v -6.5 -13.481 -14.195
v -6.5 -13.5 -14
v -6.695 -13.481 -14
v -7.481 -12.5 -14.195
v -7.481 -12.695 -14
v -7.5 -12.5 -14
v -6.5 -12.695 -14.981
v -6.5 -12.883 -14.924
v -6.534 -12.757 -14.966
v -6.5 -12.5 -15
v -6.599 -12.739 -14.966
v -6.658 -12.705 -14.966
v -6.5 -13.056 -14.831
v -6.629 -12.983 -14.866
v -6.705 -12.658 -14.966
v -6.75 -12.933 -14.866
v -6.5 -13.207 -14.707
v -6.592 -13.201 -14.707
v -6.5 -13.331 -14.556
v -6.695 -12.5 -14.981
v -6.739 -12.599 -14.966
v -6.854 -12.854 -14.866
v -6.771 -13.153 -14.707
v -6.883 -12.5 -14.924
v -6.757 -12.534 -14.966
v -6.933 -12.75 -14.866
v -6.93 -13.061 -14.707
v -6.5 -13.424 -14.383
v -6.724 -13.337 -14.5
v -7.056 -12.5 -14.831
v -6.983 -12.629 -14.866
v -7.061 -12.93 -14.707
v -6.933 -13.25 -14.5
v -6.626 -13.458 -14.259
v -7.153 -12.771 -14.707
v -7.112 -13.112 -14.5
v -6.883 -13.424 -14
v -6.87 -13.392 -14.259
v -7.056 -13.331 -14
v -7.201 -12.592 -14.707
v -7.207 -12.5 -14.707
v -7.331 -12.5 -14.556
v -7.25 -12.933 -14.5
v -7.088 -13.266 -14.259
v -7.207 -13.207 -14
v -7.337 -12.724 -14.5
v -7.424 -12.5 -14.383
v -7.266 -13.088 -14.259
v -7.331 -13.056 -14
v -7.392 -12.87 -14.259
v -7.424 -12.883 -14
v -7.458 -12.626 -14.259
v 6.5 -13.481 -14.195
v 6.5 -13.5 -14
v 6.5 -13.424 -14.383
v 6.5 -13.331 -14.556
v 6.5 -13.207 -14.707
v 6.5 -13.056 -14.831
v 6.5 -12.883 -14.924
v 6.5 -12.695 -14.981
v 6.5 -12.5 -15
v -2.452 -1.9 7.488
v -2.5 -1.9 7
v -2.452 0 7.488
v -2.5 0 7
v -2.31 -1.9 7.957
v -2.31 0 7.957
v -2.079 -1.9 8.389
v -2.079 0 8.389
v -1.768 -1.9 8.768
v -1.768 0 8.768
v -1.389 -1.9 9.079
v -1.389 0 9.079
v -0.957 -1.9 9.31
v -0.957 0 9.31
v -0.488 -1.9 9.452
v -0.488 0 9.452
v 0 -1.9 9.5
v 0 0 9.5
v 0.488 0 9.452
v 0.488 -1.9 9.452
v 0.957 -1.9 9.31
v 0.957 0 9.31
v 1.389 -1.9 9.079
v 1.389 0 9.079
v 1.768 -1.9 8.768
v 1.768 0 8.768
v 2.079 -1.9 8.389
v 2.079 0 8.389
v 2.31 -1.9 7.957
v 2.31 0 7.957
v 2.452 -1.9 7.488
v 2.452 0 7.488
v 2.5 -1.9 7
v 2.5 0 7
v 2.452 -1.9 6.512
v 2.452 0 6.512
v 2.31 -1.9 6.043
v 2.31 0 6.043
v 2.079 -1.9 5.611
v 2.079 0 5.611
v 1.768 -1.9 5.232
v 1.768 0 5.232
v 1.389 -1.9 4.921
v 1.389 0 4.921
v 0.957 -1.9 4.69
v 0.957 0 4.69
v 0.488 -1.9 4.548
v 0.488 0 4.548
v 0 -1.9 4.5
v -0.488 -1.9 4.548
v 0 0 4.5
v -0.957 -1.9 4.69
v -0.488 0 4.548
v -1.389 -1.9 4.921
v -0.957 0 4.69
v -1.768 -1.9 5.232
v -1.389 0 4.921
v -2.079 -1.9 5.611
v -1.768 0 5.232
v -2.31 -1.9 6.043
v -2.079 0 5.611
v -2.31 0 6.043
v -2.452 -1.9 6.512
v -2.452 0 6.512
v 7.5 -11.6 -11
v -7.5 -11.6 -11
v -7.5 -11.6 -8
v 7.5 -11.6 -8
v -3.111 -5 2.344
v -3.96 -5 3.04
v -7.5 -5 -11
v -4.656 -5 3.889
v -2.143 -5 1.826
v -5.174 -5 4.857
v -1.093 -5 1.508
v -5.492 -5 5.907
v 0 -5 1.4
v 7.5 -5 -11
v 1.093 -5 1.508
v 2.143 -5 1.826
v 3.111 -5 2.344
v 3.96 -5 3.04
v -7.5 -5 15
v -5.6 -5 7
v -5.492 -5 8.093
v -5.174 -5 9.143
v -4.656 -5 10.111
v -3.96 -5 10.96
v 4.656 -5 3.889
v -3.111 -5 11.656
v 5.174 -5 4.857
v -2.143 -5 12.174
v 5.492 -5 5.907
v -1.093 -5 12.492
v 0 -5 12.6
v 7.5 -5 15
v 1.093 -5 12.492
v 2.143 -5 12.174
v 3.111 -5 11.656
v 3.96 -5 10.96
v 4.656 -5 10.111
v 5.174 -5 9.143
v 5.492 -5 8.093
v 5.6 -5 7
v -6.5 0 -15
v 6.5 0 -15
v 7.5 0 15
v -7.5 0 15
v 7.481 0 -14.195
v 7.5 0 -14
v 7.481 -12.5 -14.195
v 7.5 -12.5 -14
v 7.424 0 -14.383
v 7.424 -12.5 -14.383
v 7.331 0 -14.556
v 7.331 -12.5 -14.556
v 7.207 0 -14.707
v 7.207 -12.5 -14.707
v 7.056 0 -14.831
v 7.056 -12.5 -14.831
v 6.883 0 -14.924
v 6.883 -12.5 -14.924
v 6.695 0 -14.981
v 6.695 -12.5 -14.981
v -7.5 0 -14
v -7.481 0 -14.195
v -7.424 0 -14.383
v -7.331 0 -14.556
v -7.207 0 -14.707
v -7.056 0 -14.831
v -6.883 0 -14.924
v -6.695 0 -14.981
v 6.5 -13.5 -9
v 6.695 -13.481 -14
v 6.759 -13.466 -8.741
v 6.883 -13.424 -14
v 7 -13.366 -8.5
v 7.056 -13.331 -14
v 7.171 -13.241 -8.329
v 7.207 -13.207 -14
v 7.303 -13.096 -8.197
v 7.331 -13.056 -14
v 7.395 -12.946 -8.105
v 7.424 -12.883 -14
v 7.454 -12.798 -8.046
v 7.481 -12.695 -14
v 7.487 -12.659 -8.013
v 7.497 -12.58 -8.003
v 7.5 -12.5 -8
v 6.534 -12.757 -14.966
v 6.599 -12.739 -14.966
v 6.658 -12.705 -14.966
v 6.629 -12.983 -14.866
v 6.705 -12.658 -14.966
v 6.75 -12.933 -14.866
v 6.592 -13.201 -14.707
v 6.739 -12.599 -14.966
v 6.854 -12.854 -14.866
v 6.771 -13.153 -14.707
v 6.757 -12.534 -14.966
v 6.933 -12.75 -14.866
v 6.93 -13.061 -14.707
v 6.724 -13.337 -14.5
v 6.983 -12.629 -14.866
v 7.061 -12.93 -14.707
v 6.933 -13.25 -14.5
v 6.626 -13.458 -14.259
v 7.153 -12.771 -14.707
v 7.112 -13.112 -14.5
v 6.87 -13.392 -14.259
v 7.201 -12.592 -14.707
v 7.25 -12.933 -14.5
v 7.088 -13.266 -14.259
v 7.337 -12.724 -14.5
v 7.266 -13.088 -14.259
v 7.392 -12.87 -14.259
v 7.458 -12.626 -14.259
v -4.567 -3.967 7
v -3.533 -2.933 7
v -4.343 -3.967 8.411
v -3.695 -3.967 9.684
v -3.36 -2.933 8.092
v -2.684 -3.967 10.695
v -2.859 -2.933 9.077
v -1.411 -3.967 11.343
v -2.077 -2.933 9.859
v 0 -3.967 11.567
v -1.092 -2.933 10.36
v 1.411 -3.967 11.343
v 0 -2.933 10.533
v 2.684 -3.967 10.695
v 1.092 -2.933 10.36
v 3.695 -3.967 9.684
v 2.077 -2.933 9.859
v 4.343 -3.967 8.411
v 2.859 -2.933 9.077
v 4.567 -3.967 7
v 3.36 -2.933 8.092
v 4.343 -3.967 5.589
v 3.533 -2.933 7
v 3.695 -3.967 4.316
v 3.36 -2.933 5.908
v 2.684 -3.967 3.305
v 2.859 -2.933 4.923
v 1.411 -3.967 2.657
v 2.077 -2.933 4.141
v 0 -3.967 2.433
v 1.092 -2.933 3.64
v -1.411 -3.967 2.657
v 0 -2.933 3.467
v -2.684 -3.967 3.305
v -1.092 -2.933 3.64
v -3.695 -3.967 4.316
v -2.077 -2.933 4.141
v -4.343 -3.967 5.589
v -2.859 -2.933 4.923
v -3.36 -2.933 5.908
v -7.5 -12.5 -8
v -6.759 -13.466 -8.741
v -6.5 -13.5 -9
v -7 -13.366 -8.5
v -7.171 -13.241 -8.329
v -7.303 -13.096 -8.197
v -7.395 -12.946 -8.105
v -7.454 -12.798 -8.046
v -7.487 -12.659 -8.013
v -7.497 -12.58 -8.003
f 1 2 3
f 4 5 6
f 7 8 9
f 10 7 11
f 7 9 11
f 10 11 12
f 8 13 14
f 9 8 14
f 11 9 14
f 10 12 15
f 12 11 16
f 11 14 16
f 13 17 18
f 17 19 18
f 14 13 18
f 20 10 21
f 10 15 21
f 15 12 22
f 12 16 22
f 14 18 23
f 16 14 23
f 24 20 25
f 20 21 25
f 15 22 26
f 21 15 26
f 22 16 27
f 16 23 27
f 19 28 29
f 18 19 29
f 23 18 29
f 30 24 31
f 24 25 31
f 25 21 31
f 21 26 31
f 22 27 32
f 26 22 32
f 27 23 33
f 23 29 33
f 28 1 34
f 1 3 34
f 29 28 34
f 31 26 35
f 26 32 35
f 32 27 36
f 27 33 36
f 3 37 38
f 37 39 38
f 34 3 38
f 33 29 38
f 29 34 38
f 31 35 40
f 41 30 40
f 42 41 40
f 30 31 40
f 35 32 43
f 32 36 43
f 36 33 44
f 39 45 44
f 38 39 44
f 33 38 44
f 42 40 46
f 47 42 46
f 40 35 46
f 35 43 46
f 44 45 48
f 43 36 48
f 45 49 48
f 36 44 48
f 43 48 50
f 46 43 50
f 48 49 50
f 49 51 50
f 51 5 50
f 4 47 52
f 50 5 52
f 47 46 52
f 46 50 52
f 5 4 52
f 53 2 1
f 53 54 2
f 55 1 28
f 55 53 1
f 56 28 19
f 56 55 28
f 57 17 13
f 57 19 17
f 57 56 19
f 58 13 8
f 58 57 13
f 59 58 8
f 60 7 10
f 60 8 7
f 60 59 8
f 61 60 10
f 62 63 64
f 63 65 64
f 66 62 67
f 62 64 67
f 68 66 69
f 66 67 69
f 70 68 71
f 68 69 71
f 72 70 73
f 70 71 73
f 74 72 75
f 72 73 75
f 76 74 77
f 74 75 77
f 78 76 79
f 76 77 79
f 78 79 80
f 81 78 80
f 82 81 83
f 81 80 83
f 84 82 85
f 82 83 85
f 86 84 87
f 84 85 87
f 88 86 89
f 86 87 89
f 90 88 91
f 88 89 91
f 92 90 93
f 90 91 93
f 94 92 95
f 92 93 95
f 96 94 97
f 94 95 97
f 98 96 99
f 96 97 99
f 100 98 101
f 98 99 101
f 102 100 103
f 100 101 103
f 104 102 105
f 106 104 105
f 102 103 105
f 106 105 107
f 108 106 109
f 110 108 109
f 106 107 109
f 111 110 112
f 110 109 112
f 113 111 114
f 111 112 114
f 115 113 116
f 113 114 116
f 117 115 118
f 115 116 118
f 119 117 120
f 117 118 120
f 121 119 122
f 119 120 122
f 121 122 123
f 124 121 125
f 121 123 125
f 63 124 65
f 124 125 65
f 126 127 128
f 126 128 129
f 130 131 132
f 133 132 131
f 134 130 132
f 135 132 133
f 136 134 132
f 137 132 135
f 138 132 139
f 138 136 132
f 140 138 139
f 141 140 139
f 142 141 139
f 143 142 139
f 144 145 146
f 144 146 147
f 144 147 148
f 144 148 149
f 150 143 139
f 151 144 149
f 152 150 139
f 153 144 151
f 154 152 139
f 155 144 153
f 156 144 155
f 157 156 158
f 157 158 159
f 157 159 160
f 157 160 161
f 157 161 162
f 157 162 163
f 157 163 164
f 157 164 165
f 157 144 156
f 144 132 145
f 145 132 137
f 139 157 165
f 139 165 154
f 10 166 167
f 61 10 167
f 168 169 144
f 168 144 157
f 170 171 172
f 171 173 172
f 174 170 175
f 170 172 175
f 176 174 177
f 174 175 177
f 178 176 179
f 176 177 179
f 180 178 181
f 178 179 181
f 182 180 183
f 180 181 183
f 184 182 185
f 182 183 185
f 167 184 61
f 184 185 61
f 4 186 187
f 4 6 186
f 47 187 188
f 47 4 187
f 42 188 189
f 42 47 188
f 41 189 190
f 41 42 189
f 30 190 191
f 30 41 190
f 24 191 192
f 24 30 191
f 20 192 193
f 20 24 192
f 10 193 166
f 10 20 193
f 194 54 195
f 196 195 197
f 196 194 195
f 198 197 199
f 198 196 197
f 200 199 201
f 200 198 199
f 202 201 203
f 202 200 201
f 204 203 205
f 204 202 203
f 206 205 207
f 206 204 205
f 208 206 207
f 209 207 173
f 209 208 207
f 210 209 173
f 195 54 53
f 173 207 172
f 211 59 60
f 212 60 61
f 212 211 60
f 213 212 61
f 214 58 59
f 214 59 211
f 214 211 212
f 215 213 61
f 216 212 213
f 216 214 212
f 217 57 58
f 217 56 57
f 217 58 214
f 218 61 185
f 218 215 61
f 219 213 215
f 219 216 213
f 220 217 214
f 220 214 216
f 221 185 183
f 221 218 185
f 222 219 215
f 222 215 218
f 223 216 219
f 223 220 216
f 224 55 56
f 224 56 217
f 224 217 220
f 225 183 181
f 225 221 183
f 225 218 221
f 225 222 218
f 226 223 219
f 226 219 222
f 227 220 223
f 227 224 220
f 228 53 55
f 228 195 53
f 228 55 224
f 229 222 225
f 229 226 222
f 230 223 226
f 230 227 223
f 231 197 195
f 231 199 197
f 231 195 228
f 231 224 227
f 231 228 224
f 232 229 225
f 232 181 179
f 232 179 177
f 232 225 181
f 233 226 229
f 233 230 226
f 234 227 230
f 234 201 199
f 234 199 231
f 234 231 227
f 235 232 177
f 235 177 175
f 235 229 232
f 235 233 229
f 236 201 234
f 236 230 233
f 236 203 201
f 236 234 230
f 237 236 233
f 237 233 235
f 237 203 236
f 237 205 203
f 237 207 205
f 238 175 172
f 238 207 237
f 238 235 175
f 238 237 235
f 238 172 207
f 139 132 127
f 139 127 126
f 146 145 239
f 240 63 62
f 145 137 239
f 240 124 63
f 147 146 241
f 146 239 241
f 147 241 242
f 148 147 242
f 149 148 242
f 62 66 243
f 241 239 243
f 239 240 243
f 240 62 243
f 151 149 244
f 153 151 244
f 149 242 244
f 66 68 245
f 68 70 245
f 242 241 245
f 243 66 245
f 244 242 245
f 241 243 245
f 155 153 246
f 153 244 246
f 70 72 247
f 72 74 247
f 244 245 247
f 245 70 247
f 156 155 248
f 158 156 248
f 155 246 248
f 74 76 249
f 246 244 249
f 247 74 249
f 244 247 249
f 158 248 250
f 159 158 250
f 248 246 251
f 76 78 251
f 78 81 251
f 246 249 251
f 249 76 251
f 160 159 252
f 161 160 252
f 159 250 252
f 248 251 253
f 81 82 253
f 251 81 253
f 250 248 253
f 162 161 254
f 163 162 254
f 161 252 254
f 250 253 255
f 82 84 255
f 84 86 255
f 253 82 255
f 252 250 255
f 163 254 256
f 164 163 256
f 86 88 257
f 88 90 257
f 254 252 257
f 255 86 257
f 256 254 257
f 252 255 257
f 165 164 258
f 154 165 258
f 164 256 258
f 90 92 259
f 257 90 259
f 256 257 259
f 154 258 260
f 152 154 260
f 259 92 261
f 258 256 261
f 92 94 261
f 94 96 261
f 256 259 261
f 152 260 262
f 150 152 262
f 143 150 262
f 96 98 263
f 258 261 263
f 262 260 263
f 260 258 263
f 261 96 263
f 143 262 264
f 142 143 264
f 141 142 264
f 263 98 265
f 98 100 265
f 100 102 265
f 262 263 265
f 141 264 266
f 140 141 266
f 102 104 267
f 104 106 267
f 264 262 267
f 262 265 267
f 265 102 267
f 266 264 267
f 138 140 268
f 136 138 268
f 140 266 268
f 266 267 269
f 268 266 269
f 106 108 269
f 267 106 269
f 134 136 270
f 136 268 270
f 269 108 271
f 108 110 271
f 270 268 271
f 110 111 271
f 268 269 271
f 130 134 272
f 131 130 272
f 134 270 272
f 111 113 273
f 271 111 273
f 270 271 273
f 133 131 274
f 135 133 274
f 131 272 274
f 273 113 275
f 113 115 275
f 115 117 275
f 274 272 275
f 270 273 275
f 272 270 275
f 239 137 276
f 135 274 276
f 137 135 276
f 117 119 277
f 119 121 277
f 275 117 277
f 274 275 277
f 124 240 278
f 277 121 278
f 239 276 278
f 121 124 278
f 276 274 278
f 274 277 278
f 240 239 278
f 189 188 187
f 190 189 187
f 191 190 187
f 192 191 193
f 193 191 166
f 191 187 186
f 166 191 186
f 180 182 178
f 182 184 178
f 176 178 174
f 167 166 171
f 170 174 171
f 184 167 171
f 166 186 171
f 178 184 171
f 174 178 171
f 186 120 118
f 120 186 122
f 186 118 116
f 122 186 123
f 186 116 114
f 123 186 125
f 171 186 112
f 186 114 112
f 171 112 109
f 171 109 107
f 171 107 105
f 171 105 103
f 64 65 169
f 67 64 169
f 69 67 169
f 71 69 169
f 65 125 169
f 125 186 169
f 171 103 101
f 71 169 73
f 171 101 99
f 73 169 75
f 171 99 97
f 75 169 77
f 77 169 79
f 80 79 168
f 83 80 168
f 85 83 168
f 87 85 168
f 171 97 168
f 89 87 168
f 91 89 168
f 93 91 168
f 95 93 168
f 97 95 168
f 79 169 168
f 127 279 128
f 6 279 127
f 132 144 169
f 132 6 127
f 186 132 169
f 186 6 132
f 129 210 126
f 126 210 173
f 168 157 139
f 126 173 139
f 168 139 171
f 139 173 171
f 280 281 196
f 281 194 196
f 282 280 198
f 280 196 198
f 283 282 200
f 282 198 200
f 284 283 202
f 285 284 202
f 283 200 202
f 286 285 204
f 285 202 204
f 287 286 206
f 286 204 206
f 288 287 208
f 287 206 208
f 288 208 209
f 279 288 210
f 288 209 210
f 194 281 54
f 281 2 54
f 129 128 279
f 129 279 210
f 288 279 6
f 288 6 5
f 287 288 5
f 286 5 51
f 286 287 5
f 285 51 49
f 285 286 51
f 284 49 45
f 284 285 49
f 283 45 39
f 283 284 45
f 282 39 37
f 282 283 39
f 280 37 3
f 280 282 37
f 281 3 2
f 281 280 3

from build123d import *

# Parameters (mm, degrees)
F0_W           = 15
F0_H           = 30
F1_DEPTH       = 5
F3_D           = 5
F3_CSINK_D     = 11.2
F3_CSINK_ANGLE = 90
F4_W           = 15
F4_H           = 4
F5_DEPTH       = 8.5
F6_W           = 15
F6_H           = 1.9
F7_DEPTH       = 3
F8_R           = 1


with BuildPart() as f1:
    # F0 (on Front) → F1 (new body)
    with BuildSketch(Plane.XZ):
        Rectangle(F0_W, F0_H)
    extrude(amount=F1_DEPTH)

    # F3 (through all)
    with Locations(Plane.XZ.offset(5)):
        with Locations((0, 7)):
            CounterSinkHole(F3_D / 2, F3_CSINK_D / 2, counter_sink_angle=F3_CSINK_ANGLE)

    # F4 (on face) → F5 (join)
    with BuildSketch(Plane.XZ.offset(5)):
        with Locations((0, -13)):
            Rectangle(F4_W, F4_H)
    extrude(amount=F5_DEPTH)

    # F6 (on face) → F7 (join)
    with BuildSketch(Plane.XY.offset(-11)):
        with Locations((0, -12.55)):
            Rectangle(F6_W, F6_H)
    extrude(amount=F7_DEPTH)

    # F8
    f8_edges = [f1.edges().sort_by_distance(p)[0] for p in [
        (0, -13.5, -8),
        (7.5, -13.5, -11.5),
        (-7.5, -13.5, -11.5),
        (0, -13.5, -15),
        (7.5, -6.75, -15),
        (-7.5, -6.75, -15),
    ]]
    fillet(f8_edges, radius=F8_R)


solid = f1.part
